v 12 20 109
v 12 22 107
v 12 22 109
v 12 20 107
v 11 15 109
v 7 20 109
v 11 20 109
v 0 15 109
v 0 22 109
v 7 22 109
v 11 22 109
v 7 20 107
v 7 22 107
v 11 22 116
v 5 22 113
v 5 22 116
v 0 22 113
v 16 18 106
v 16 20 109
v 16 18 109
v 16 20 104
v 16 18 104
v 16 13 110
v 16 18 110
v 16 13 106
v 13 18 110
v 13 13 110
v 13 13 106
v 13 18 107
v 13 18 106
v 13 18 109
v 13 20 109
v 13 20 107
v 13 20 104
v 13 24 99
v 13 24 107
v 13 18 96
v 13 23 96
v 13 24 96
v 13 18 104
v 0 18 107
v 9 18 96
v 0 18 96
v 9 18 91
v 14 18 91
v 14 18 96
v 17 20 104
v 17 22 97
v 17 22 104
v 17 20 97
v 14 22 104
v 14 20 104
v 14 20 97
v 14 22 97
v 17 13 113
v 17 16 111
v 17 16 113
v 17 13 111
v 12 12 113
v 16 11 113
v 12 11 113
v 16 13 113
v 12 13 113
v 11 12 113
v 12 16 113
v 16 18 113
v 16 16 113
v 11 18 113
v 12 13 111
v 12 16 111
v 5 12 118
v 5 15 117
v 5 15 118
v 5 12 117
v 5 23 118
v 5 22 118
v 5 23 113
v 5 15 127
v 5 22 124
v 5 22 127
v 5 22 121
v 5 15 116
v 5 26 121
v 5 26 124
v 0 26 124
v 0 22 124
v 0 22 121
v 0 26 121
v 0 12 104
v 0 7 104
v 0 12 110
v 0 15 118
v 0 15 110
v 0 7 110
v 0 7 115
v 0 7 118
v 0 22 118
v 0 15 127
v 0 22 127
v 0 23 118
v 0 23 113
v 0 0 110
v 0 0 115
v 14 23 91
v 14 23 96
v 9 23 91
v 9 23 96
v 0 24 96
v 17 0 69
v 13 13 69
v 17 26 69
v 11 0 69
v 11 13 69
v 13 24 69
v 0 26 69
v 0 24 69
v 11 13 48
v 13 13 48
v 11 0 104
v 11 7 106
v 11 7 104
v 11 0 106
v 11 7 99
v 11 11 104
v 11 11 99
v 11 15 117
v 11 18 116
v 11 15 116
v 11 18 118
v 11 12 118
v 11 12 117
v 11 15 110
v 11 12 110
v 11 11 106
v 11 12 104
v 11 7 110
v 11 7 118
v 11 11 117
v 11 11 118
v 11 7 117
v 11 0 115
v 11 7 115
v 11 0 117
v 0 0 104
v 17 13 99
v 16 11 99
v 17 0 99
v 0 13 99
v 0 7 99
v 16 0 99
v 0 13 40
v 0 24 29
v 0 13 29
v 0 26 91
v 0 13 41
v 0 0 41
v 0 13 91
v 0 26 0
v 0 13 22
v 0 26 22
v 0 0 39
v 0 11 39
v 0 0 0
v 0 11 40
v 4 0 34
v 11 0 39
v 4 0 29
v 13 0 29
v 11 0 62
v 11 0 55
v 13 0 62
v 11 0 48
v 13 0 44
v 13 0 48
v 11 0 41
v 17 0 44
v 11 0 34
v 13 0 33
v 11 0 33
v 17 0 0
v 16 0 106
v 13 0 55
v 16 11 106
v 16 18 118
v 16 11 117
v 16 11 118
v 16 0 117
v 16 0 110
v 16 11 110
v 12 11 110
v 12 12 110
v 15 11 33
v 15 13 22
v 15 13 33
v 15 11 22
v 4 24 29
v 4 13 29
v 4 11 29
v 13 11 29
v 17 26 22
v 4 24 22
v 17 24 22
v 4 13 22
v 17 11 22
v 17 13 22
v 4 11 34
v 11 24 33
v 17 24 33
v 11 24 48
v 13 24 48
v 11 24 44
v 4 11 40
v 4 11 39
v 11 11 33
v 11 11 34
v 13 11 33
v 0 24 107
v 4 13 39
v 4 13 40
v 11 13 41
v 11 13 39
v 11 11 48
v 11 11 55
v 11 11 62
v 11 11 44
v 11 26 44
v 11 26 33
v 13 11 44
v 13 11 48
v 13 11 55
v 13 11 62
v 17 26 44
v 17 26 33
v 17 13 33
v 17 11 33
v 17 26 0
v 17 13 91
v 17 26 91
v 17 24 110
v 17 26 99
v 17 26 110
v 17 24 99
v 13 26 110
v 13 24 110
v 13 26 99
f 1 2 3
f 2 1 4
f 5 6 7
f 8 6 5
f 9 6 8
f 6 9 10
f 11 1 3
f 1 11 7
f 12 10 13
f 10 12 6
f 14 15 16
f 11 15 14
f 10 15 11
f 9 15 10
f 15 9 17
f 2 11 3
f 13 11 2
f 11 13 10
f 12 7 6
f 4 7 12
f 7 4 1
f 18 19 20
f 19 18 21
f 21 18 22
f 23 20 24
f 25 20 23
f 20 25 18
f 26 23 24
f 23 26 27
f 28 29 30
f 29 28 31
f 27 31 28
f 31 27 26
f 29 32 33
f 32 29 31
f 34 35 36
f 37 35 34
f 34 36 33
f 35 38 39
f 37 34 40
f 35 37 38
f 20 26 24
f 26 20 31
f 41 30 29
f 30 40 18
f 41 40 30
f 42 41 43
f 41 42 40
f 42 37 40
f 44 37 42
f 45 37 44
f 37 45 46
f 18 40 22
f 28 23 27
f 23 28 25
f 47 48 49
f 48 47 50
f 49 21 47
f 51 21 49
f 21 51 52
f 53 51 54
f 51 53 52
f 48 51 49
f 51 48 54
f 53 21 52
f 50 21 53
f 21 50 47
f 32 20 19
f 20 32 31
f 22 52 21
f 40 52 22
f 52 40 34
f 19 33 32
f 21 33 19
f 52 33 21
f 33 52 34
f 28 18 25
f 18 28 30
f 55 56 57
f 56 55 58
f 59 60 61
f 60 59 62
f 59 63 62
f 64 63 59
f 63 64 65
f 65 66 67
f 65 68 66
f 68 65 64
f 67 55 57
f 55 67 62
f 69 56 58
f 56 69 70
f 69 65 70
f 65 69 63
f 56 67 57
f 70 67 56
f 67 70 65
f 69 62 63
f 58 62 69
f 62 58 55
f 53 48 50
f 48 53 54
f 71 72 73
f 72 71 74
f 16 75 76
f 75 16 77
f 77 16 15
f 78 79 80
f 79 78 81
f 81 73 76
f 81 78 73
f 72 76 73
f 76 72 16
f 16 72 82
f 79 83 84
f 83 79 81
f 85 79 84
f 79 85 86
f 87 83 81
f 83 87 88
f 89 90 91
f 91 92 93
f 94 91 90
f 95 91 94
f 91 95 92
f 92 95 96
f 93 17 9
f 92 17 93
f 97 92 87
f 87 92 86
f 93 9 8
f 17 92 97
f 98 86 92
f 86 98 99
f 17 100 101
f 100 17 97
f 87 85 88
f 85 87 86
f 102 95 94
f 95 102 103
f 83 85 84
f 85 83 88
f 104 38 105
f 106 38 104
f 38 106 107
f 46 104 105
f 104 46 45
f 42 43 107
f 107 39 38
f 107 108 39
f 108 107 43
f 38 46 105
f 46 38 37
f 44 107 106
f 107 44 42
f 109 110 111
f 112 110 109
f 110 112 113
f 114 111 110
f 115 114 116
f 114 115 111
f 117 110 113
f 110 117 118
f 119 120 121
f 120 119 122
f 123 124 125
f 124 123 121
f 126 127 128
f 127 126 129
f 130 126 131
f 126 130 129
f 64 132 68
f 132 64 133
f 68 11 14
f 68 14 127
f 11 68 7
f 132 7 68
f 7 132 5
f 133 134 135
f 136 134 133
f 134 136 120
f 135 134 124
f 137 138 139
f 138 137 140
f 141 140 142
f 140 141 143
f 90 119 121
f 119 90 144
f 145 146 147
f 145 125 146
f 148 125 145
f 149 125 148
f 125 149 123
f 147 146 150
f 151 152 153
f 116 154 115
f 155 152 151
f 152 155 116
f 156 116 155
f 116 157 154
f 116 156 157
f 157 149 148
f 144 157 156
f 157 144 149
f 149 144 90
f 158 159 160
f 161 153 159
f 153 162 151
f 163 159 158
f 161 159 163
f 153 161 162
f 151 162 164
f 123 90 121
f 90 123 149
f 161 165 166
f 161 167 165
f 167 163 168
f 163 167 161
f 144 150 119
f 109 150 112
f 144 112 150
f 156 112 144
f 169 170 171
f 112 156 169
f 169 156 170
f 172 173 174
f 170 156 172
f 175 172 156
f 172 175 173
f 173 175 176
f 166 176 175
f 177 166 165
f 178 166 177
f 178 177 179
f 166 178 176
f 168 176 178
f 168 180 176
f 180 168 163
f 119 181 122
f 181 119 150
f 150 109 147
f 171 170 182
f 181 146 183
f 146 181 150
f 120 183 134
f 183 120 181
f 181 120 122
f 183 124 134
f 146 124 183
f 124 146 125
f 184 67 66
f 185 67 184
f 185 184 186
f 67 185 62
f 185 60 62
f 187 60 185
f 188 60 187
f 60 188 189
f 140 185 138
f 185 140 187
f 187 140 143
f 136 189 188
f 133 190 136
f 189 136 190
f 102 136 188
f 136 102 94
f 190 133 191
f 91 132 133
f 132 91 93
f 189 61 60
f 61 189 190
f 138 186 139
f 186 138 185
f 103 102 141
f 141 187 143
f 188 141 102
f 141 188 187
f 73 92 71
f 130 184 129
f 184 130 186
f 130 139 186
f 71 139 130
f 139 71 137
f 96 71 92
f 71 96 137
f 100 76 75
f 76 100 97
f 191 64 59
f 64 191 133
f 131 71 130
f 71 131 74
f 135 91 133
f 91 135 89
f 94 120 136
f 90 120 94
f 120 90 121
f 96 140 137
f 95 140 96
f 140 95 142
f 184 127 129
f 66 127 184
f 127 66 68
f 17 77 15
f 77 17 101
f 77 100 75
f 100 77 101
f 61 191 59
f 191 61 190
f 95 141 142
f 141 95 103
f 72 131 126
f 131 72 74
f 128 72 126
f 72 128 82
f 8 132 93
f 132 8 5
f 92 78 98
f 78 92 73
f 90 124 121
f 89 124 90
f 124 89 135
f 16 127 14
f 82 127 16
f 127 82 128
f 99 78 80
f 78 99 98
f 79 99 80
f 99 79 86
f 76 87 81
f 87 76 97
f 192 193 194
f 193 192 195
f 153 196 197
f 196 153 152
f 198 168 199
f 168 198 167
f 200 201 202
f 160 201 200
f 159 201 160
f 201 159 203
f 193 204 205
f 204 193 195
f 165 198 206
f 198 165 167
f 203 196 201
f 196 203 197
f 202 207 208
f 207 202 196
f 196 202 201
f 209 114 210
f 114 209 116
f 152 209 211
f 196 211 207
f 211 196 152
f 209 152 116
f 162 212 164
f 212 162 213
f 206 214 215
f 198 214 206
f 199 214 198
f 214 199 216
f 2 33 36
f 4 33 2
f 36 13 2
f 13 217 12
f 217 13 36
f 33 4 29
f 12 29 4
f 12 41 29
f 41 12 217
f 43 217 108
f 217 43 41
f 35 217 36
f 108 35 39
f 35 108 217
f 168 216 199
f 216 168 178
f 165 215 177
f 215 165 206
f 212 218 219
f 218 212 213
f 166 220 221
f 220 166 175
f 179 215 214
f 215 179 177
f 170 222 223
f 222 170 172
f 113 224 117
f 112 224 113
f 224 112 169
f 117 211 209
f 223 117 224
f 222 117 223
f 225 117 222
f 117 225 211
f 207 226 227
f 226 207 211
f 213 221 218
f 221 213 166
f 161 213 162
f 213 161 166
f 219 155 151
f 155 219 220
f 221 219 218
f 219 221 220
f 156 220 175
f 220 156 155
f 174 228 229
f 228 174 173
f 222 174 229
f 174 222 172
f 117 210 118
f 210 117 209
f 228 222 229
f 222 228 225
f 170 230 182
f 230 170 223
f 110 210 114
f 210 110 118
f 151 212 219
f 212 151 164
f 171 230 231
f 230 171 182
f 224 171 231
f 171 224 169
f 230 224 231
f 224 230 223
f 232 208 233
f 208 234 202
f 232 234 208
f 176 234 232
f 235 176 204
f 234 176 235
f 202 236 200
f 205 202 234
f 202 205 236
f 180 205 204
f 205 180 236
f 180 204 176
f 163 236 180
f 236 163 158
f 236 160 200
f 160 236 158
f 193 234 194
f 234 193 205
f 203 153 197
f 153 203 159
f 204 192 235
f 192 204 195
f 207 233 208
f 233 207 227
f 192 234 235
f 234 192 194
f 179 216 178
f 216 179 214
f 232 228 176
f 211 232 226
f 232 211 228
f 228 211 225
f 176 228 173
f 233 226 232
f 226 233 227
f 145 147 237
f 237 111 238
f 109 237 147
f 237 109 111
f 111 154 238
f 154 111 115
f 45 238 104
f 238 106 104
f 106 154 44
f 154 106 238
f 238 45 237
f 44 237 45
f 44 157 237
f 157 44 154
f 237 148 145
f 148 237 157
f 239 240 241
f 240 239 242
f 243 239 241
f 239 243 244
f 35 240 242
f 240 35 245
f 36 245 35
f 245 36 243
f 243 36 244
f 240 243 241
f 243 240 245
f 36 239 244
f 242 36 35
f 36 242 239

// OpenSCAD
translate([9.5, 21.0, 107.5]) color([0.6149371087697887, 0.0400488022899097, 0.34025031183581533]) cube([5, 2, 3], center=true);
translate([14.5, 15.5, 109.0]) color([0.7380159626358669, 0.3765176313166855, 0.6257641682954356]) cube([3, 5, 2], center=true);
translate([15.5, 21.0, 101.5]) color([0.8894786539399329, 0.4963449395419606, 0.3583651728386771]) cube([3, 2, 5], center=true);
translate([14.5, 19.0, 106.5]) color([0.6716454412848432, 0.45811681625355094, 0.5074379917667022]) cube([3, 2, 5], center=true);
translate([14.5, 15.5, 107.0]) color([0.16228475224599026, 0.7529781863444399, 0.3376457636791449]) cube([3, 5, 2], center=true);
translate([14.5, 14.5, 112.0]) color([0.8033239356600728, 0.9444207727357242, 0.014783921172948133]) cube([5, 3, 2], center=true);
translate([15.5, 21.0, 98.0]) color([0.5303420268039528, 0.2882277186993394, 0.4689175335863792]) cube([3, 2, 2], center=true);
translate([2.5, 23.5, 122.5]) color([0.03492832759702502, 0.5317931441254861, 0.552095437515129]) cube([5, 5, 3], center=true);
translate([12.5, 15.5, 84.5]) color([0.9340898594770107, 0.03830085289416996, 0.3950652682884612]) cube([7, 5, 3], center=true);
translate([5.5, 20.5, 86.5]) color([0.1200155720396251, 0.34658884626630715, 0.051152415727703016]) cube([7, 5, 3], center=true);
translate([11.5, 20.5, 92.5]) color([0.2730496953424699, 0.9956802504828091, 0.25391998649183944]) cube([5, 5, 7], center=true);
translate([5.5, 20.5, 79.5]) color([0.6803935586065328, 0.7027090324157298, 0.9291230685247301]) cube([7, 5, 3], center=true);
translate([11.5, 21.5, 79.5]) color([0.9949404722907454, 0.7620813713006523, 0.7625973189567923]) cube([5, 7, 3], center=true);
translate([8.5, 21.0, 101.5]) color([0.5162610213479427, 0.3860717563215982, 0.8343975914408754]) cube([3, 2, 5], center=true);
translate([13.5, 16.5, 71.5]) color([0.2506337702942619, 0.11599539642064438, 0.9817240858781537]) cube([3, 7, 5], center=true);
translate([11.5, 20.5, 84.5]) color([0.8047994372884794, 0.9431012043694105, 0.24264659424234813]) cube([5, 5, 7], center=true);
translate([12.5, 20.5, 88.5]) color([0.6738638931519124, 0.5327800265053269, 0.8756440829735669]) cube([7, 5, 1], center=true);
translate([12.5, 15.5, 87.5]) color([0.16255101499230828, 0.8680483691353614, 0.15305579700066485]) cube([7, 5, 3], center=true);
translate([5.5, 3.5, 101.5]) color([0.8462165202751376, 0.8200801239095041, 0.5849326984313064]) cube([11, 7, 5], center=true);
translate([13.5, 5.5, 102.5]) color([0.05125489506773162, 0.156166769208809, 0.34458118202681143]) cube([5, 11, 7], center=true);
translate([13.5, 5.5, 113.5]) color([0.291190613997825, 0.29342424365134856, 0.49485912757206985]) cube([5, 11, 7], center=true);
translate([5.5, 9.5, 114.5]) color([0.40365829021262367, 0.43100562682353716, 0.17003546655932655]) cube([11, 5, 7], center=true);
translate([13.5, 14.5, 115.5]) color([0.788340085303476, 0.5686027559906347, 0.44188886974638586]) cube([5, 7, 5], center=true);
translate([2.5, 17.5, 115.5]) color([0.3413461590512491, 0.009317740415098474, 0.72162474304745]) cube([5, 11, 5], center=true);
translate([8.5, 9.5, 111.5]) color([0.9099060293040379, 0.6642090292154819, 0.6628365798191557]) cube([7, 5, 3], center=true);
translate([13.5, 9.0, 111.5]) color([0.2575988974219705, 0.6122127561841502, 0.07024606726227145]) cube([5, 4, 3], center=true);
translate([5.5, 3.5, 112.5]) color([0.936077955543095, 0.27870721332570936, 0.8301443917589898]) cube([11, 7, 5], center=true);
translate([5.5, 13.5, 113.5]) color([0.5295296249528143, 0.06328696503387199, 0.639390097241117]) cube([11, 3, 7], center=true);
translate([5.5, 9.5, 107.5]) color([0.579686955437464, 0.9416538141960143, 0.6321291610349786]) cube([11, 5, 7], center=true);
translate([5.5, 18.5, 112.5]) color([0.5434228748459046, 0.38469874676133664, 0.434637548519362]) cube([11, 7, 7], center=true);
translate([2.5, 18.5, 121.5]) color([0.31139777068021024, 0.01363511702942577, 0.7785312160167684]) cube([5, 7, 11], center=true);
translate([9.5, 17.5, 25.5]) color([0.8197509625398982, 0.28044077713976767, 0.2581907625337724]) cube([11, 13, 7], center=true);
translate([6.5, 21.0, 101.5]) color([0.5272652548146236, 0.3179301097250754, 0.3422638341038545]) cube([13, 6, 11], center=true);
translate([6.5, 5.5, 25.5]) color([0.7055726929201963, 0.43169639849300545, 0.14170724037842175]) cube([13, 11, 7], center=true);
translate([9.5, 17.5, 31.5]) color([0.0059275683019511805, 0.5113413643489257, 0.7846494738841625]) cube([11, 13, 5], center=true);
translate([5.5, 6.5, 36.5]) color([0.7013909140505133, 0.7815279332048084, 0.38414456219182536]) cube([11, 13, 5], center=true);
translate([6.5, 18.5, 37.5]) color([0.4641305725985776, 0.036369164001931575, 0.9124290899309246]) cube([13, 11, 7], center=true);
translate([6.5, 5.5, 44.5]) color([0.6366653413633517, 0.798477007479407, 0.7602358551941967]) cube([13, 11, 7], center=true);
translate([5.5, 17.5, 44.5]) color([0.899814300356001, 0.3622224295816935, 0.9815510059994267]) cube([11, 13, 7], center=true);
translate([5.5, 6.5, 51.5]) color([0.15851660579635174, 0.19450942151924966, 0.35447317829590397]) cube([11, 13, 7], center=true);
translate([6.5, 18.5, 51.5]) color([0.700089123077614, 0.019141470871264166, 0.7352582011311831]) cube([13, 11, 7], center=true);
translate([2.0, 17.5, 34.5]) color([0.5715587801616956, 0.24207966979200135, 0.18514161515939986]) cube([4, 13, 11], center=true);
translate([6.5, 5.5, 58.5]) color([0.7580746928341441, 0.4199819570625165, 0.5731405723704375]) cube([13, 11, 7], center=true);
translate([5.5, 17.5, 58.5]) color([0.23673356878784502, 0.7138158488992904, 0.8637627475626694]) cube([11, 13, 7], center=true);
translate([5.5, 6.5, 65.5]) color([0.8949592620642776, 0.8103115760161889, 0.1004216369837837]) cube([11, 13, 7], center=true);
translate([6.5, 18.5, 58.5]) color([0.18827941391234093, 0.44049583318501173, 0.06522983258952386]) cube([13, 11, 7], center=true);
translate([6.5, 18.5, 65.5]) color([0.42674703623912436, 0.3947422574489625, 0.27185274848852736]) cube([13, 11, 7], center=true);
translate([8.5, 6.5, 5.5]) color([0.43721657158275895, 0.7577296702077931, 0.3561631337530091]) cube([17, 13, 11], center=true);
translate([8.5, 19.5, 5.5]) color([0.3277620307403001, 0.30701912216942273, 0.492518074892234]) cube([17, 13, 11], center=true);
translate([8.5, 6.5, 16.5]) color([0.7625268269371841, 0.2027877178963453, 0.39789846082497404]) cube([17, 13, 11], center=true);
translate([8.5, 19.5, 16.5]) color([0.4356119392473006, 0.6353731723550147, 0.673076446274384]) cube([17, 13, 11], center=true);
translate([2.0, 6.5, 28.0]) color([0.6970991483341651, 0.8225488218547198, 0.5826892216899469]) cube([4, 13, 12], center=true);
translate([16.0, 5.5, 28.0]) color([0.3545830833155835, 0.5687886411459258, 0.564415288794693]) cube([2, 11, 12], center=true);
translate([14.0, 6.5, 27.5]) color([0.2783497745403337, 0.8220051901362931, 0.39809270556066123]) cube([2, 13, 11], center=true);
translate([15.0, 18.5, 27.5]) color([0.9209203386432881, 0.13533998311747797, 0.08148203466772541]) cube([4, 11, 11], center=true);
translate([14.0, 6.5, 38.5]) color([0.8649487446802395, 0.36102136972914045, 0.06937329613248533]) cube([6, 13, 11], center=true);
translate([14.0, 19.5, 38.5]) color([0.7172877126247486, 0.671396341477498, 0.47110224547326685]) cube([6, 13, 11], center=true);
translate([8.5, 6.5, 74.5]) color([0.3145322421799046, 0.8413649413366762, 0.9545082818366412]) cube([17, 13, 11], center=true);
translate([8.5, 19.5, 74.5]) color([0.02538948740661906, 0.39264862168779513, 0.12527064222330164]) cube([17, 13, 11], center=true);
translate([8.5, 6.5, 85.5]) color([0.9928151500577586, 0.6355716010561779, 0.40641678624517696]) cube([17, 13, 11], center=true);
translate([8.5, 19.5, 85.5]) color([0.1421319514189895, 0.14748951348813844, 0.8666090764559645]) cube([17, 13, 11], center=true);
translate([8.5, 6.5, 95.0]) color([0.5114920143771782, 0.16291179601388028, 0.8928293074217152]) cube([17, 13, 8], center=true);
translate([15.0, 25.0, 104.5]) color([0.9106207302279238, 0.7053130391381187, 0.7162737307255599]) cube([4, 2, 11], center=true);
translate([14.0, 8.5, 6.5]) color([0.7235742512845528, 0.7298089625221481, 0.5196081403156461]) cube([6, 17, 13], center=true);
translate([8.5, 6.5, 5.5]) color([0.823493134639761, 0.6911885197769689, 0.6973164426626367]) cube([17, 13, 11], center=true);
